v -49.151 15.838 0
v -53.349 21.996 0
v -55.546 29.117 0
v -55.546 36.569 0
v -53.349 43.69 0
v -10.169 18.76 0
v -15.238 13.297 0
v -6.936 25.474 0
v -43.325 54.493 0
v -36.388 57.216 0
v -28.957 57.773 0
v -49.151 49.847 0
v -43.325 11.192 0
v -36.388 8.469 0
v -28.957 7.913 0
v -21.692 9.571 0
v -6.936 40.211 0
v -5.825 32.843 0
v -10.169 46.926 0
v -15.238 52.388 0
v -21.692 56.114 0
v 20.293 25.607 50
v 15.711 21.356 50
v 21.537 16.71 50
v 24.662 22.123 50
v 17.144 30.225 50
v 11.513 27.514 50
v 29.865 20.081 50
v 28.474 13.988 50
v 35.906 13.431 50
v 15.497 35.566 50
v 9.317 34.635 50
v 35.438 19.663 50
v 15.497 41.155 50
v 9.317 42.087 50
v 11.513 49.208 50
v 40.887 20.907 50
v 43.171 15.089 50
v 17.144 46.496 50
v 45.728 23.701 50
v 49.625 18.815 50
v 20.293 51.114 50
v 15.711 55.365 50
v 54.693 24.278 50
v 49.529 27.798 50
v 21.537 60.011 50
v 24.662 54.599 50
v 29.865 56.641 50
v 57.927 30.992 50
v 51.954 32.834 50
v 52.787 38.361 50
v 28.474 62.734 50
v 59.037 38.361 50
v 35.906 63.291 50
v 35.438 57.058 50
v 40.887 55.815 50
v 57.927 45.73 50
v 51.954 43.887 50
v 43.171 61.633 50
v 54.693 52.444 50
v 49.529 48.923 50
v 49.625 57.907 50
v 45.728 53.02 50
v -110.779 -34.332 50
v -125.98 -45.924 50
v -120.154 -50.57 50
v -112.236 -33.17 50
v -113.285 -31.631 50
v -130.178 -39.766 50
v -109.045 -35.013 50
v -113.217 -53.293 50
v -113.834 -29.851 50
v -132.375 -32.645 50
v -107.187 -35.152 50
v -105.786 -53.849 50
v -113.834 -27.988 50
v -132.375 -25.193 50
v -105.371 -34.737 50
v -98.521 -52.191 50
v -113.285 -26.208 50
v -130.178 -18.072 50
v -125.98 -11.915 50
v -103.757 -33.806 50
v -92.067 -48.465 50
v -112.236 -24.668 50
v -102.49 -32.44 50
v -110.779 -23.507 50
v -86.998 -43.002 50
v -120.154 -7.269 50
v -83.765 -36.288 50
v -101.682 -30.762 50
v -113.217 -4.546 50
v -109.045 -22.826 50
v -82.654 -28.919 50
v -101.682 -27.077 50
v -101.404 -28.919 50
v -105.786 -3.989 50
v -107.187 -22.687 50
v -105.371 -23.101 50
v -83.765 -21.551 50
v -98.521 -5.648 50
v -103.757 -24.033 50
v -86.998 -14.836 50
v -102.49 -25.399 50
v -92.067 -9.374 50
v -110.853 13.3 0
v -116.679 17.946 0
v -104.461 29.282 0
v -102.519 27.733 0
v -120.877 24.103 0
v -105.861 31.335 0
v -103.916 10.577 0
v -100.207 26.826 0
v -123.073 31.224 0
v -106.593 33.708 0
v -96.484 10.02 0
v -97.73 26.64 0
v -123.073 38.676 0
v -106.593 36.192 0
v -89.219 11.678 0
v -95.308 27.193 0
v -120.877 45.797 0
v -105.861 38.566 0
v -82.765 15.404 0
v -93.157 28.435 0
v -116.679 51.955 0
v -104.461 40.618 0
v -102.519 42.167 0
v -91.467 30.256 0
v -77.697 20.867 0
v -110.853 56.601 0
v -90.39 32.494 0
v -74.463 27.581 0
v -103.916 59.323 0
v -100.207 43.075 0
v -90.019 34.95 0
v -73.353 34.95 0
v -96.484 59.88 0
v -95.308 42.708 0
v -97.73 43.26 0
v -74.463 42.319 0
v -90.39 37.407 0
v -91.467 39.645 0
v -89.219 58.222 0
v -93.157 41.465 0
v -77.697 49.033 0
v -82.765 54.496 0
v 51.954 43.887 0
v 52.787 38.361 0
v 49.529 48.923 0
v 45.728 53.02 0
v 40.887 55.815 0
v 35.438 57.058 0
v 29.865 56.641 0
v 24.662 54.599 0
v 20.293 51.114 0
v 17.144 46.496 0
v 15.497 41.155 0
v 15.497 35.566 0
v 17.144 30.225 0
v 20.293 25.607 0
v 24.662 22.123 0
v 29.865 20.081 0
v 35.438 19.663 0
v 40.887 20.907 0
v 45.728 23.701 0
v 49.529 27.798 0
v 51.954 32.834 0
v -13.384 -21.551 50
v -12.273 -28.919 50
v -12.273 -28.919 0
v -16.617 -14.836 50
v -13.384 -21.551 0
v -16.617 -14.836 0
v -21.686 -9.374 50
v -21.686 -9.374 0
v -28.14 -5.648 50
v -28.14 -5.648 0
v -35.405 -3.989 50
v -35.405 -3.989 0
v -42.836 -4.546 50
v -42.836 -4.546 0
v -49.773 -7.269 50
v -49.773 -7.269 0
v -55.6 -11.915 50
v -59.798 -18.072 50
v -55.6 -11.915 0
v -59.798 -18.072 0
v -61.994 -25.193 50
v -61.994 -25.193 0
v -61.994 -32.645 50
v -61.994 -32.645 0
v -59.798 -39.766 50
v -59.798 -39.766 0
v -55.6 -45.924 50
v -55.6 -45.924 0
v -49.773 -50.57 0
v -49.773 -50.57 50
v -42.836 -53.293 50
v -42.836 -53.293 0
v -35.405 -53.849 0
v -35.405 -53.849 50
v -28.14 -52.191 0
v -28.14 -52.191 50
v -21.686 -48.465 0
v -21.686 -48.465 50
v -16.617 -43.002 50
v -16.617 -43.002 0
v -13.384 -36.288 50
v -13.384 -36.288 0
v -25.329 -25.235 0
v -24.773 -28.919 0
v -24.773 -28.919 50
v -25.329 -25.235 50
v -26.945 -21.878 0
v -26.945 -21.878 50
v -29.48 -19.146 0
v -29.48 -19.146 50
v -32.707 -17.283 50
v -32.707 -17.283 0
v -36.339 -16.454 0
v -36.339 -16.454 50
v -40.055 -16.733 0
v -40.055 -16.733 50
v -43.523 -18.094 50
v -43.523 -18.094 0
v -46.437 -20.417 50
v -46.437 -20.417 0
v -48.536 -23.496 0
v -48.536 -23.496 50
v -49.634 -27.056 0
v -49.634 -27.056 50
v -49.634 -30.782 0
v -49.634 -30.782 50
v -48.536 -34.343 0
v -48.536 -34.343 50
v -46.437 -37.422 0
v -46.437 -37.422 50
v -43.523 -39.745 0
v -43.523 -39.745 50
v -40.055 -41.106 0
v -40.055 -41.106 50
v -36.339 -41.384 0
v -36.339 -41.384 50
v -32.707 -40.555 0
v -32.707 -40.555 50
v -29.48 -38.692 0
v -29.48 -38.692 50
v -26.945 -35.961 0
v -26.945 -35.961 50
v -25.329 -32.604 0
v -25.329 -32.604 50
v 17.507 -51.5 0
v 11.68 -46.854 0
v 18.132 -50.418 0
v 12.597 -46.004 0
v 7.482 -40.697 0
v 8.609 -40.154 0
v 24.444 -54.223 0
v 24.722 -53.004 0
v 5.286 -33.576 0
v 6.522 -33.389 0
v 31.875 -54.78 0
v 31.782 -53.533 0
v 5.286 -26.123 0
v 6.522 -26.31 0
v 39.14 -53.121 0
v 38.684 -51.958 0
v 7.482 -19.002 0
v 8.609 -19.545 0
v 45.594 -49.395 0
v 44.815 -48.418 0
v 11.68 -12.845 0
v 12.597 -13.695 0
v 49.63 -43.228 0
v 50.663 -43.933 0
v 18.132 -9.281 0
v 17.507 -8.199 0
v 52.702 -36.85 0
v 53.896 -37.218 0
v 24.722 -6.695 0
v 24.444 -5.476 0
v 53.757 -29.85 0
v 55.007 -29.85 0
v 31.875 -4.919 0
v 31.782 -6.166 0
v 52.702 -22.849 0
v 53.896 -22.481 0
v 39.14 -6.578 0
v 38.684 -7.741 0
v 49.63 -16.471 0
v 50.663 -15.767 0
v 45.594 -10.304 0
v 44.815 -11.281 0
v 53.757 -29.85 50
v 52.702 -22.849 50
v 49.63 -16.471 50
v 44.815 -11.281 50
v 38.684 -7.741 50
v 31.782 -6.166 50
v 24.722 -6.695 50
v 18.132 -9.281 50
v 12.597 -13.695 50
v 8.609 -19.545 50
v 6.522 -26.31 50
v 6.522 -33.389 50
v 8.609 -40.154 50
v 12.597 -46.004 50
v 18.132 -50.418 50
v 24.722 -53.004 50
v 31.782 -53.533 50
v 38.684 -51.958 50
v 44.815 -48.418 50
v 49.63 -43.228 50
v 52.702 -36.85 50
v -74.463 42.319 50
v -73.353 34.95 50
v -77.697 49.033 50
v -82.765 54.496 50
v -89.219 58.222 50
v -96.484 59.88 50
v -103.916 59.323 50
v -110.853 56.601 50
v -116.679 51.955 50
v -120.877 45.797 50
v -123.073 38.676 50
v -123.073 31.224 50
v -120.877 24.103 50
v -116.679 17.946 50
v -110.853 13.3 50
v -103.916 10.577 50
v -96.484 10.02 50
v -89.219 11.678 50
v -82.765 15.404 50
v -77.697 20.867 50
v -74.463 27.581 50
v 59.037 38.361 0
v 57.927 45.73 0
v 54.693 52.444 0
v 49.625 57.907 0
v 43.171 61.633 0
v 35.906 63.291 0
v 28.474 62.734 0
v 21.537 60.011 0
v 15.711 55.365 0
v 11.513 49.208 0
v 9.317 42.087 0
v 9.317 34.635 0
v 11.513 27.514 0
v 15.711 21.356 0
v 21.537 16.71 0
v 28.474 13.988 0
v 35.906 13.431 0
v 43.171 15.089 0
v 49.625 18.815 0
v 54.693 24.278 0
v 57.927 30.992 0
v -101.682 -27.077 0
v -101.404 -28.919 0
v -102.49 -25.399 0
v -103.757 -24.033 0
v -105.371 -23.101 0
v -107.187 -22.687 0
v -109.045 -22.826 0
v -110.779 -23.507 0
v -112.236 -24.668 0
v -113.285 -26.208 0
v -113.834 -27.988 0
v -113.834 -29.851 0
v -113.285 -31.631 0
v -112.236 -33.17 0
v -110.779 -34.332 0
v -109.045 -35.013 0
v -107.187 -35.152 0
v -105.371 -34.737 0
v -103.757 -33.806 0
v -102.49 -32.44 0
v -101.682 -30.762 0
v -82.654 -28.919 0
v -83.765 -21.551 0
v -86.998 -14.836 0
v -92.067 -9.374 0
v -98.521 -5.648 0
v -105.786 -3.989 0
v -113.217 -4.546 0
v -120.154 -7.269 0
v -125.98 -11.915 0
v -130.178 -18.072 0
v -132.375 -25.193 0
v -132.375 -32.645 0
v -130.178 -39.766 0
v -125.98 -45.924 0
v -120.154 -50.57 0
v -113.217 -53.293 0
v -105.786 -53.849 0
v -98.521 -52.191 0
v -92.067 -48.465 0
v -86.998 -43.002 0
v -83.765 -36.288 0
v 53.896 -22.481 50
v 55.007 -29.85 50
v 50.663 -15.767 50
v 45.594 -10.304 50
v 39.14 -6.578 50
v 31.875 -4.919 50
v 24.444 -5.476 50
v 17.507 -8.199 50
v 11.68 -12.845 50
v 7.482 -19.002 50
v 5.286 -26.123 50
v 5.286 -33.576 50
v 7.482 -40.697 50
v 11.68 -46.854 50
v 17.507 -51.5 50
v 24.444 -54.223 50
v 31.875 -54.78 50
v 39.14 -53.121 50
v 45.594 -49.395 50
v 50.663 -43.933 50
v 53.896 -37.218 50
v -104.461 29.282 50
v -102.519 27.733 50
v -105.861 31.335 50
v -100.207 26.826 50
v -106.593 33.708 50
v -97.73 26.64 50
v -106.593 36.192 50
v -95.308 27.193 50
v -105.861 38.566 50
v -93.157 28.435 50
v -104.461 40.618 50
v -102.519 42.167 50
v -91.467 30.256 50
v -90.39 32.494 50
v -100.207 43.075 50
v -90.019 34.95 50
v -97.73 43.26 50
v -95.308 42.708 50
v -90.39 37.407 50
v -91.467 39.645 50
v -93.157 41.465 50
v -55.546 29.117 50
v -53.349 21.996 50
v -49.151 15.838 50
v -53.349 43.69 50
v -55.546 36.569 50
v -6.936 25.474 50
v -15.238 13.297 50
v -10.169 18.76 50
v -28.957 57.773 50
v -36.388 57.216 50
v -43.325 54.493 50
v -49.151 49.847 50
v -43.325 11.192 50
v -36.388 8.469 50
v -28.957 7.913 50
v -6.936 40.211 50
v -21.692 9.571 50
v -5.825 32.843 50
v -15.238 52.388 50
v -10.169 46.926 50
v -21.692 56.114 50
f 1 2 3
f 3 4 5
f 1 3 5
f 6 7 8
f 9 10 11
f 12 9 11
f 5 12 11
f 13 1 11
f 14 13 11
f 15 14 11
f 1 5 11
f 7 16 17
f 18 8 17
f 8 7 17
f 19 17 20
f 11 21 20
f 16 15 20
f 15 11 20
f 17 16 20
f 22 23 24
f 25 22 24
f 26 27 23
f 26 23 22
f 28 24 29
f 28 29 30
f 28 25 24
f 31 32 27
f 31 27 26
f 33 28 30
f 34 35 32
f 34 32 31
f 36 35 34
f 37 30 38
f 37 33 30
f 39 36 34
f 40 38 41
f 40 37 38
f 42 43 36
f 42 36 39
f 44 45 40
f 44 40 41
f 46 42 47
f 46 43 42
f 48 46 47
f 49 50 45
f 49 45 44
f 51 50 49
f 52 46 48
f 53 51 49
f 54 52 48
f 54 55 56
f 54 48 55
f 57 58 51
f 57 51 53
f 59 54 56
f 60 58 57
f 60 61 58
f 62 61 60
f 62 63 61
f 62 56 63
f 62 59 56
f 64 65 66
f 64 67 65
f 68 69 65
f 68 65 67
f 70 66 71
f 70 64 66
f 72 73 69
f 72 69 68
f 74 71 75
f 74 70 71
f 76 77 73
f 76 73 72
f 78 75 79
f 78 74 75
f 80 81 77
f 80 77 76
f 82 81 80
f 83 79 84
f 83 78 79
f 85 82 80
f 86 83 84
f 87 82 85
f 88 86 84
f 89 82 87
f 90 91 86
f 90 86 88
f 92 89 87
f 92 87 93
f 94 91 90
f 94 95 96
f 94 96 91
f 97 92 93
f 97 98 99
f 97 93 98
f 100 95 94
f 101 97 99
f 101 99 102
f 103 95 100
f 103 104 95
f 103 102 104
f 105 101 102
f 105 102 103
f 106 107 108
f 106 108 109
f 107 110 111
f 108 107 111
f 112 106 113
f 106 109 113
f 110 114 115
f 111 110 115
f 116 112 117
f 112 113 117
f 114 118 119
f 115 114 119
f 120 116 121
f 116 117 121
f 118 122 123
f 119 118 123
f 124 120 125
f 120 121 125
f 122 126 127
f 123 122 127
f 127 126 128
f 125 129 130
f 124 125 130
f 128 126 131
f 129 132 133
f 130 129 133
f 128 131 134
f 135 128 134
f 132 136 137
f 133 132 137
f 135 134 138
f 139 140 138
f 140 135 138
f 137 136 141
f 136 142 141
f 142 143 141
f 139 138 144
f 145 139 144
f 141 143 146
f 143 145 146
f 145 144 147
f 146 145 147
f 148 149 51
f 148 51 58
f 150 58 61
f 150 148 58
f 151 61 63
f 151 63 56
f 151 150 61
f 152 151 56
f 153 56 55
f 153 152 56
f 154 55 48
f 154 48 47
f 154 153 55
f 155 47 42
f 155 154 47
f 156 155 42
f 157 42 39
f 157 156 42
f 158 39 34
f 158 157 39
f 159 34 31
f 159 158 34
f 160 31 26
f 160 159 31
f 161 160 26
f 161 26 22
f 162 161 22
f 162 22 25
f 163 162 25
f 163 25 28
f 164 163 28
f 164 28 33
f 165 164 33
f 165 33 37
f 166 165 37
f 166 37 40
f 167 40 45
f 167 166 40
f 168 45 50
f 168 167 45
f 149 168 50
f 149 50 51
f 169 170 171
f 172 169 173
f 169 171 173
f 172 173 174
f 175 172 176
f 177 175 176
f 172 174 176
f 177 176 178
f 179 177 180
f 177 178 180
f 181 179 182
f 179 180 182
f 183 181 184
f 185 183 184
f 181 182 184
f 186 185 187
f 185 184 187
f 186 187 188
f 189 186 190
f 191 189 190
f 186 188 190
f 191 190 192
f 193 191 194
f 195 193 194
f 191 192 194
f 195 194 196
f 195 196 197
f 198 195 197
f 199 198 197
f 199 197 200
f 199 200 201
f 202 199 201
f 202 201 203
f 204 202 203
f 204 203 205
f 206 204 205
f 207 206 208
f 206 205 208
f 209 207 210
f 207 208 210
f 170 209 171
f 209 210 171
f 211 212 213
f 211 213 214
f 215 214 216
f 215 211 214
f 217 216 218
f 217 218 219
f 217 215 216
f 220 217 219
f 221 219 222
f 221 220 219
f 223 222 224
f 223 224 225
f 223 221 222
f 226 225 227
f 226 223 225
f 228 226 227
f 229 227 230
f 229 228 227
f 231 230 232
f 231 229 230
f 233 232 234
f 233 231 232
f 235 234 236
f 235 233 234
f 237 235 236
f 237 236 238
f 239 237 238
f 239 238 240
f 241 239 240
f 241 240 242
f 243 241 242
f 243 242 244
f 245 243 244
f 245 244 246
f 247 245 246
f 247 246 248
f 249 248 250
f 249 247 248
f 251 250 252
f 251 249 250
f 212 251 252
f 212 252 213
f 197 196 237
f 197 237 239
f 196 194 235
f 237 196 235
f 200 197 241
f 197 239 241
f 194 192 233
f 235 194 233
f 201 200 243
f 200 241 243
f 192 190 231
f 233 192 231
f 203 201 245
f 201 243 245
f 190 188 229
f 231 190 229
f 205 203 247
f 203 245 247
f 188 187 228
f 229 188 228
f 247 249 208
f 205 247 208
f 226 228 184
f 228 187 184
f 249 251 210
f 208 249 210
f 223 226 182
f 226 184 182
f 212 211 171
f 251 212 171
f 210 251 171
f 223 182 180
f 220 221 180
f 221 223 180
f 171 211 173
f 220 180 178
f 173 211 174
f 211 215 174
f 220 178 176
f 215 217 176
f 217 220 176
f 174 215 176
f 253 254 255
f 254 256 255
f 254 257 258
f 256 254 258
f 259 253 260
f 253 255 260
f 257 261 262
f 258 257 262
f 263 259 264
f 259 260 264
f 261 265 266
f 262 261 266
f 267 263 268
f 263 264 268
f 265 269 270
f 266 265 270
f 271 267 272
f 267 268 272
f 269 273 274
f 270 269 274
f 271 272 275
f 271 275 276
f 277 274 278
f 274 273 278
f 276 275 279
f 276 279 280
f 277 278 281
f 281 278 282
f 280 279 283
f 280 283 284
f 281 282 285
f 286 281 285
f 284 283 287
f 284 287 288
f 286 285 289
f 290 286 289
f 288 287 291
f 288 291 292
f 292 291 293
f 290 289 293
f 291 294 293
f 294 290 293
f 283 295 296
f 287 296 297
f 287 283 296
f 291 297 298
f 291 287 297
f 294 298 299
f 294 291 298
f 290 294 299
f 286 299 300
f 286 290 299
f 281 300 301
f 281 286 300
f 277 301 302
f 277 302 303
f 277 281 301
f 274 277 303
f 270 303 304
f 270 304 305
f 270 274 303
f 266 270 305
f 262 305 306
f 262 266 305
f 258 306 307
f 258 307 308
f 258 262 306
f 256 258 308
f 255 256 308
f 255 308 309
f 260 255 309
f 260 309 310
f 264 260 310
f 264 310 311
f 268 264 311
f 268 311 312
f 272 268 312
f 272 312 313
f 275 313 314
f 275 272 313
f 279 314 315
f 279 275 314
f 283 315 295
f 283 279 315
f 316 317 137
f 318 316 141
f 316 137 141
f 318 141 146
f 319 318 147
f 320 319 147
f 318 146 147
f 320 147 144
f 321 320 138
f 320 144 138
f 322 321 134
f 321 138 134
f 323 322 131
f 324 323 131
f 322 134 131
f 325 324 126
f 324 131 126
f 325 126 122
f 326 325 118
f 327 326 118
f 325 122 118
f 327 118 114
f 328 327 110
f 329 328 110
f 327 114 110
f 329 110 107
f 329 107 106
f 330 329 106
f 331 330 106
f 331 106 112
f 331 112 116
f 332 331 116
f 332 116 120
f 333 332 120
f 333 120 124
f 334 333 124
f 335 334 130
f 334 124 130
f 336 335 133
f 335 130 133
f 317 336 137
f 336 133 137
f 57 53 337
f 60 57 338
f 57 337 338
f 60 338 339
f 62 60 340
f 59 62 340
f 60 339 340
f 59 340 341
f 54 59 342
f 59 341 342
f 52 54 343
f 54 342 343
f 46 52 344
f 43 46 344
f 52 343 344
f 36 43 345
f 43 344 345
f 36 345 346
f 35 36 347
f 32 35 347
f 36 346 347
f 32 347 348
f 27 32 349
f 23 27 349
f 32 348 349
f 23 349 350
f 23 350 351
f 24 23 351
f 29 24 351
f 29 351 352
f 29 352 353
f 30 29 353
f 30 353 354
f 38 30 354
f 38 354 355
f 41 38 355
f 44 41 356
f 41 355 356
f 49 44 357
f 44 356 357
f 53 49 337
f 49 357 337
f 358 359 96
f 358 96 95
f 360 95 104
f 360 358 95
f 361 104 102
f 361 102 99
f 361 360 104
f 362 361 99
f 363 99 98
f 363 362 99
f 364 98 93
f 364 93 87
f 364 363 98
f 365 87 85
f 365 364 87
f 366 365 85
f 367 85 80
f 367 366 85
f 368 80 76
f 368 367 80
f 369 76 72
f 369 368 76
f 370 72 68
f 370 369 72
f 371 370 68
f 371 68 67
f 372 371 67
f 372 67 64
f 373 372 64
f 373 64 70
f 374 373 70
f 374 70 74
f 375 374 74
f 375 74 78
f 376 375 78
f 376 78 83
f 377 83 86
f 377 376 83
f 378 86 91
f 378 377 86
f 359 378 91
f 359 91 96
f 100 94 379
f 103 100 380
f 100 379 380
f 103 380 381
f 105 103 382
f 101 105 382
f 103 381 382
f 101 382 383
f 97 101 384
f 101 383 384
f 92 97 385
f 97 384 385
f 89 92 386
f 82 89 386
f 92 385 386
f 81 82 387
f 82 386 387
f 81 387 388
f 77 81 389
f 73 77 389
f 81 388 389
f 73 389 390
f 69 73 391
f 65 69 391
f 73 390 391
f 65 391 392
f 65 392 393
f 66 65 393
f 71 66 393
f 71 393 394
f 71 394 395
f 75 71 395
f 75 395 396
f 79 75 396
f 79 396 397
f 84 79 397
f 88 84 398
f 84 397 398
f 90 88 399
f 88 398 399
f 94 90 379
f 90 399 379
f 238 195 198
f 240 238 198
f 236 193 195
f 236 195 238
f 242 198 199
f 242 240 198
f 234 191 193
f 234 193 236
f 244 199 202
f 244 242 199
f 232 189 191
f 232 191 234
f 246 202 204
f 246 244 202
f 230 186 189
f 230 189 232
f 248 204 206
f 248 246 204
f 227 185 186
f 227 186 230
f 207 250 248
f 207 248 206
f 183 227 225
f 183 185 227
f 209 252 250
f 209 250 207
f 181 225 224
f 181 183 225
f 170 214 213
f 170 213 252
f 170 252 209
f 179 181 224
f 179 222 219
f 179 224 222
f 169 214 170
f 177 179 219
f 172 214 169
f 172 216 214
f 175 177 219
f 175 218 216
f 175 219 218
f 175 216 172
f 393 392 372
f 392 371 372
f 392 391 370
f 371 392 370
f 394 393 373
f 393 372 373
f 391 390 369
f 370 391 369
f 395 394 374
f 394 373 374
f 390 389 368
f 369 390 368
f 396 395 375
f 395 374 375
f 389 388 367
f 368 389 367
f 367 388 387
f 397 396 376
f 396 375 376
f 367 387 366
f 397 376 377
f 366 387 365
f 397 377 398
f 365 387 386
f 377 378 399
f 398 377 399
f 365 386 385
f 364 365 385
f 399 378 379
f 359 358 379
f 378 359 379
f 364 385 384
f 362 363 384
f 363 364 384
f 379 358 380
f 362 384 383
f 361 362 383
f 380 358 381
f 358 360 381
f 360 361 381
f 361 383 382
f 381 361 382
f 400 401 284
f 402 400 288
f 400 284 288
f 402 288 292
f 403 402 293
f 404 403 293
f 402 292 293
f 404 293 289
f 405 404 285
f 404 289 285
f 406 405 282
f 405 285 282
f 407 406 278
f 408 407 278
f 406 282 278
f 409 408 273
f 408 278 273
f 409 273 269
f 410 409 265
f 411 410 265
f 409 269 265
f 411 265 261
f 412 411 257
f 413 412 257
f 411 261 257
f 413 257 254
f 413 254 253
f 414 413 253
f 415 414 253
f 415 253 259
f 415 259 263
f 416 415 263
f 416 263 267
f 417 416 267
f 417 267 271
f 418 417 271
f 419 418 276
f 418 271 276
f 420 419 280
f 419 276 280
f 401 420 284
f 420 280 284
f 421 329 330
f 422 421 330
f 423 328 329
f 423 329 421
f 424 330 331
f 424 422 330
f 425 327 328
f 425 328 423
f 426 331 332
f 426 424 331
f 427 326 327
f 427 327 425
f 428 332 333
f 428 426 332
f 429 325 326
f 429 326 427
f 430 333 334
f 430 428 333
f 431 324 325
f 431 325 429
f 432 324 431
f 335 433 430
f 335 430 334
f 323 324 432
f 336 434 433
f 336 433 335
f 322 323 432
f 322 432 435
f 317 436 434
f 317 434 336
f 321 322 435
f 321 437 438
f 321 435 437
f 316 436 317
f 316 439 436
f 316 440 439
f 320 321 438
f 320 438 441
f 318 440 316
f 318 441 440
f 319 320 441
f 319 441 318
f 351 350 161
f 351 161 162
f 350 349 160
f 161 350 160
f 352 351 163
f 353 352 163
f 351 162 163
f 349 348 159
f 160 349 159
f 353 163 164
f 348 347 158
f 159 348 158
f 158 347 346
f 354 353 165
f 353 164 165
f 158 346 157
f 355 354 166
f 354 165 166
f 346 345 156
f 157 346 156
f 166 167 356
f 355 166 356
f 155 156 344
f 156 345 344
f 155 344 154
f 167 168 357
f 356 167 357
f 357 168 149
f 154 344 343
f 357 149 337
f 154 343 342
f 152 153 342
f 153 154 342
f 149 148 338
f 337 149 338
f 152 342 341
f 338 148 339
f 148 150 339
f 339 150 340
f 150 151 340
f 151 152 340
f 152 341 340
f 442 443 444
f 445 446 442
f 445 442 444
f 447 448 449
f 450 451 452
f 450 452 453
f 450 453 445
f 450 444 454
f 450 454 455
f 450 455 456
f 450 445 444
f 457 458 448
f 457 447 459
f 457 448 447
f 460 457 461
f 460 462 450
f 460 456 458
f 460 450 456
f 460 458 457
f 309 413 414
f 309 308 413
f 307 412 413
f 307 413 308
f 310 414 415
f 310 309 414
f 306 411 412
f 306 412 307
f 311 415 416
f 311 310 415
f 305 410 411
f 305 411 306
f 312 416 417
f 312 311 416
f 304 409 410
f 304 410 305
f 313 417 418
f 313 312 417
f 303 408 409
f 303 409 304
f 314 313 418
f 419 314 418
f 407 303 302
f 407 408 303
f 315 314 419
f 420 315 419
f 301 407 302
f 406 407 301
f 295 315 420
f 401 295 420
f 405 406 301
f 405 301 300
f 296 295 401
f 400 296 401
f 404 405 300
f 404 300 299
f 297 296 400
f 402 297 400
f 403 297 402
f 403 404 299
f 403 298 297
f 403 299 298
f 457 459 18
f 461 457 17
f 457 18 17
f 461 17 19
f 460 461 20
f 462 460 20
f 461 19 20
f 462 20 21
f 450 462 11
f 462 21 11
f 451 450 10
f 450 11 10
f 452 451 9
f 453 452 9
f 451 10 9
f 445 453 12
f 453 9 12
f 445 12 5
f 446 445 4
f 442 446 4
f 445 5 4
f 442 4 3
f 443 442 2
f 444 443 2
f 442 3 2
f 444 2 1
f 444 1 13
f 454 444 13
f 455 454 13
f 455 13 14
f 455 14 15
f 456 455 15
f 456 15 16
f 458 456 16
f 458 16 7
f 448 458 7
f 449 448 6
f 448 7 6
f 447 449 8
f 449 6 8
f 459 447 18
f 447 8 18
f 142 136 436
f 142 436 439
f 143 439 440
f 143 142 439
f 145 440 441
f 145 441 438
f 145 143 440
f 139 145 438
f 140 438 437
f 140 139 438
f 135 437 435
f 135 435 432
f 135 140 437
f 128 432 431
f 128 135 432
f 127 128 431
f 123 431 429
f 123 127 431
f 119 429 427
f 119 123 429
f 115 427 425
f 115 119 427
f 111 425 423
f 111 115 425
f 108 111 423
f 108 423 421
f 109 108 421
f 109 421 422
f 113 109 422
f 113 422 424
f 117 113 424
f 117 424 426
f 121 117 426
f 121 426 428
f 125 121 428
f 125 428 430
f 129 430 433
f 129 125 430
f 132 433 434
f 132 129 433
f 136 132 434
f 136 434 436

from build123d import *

# Parameters (mm, degrees)
F0_R     = 25
F0_R_2   = 8.333333
F0_R_3   = 18.75
F0_R_4   = 6.25
F0_R_5   = 12.5
F0_R_6   = 23.75
F1_DEPTH = 50


with BuildPart() as f1:
    # F0 (on Top) → F1 (new body)
    with BuildSketch(Plane.XY):
        with Locations((-98.352633, 34.950223)):
            Circle(F0_R)
        with Locations((-98.352633, 34.950223)):
            Circle(F0_R_2, mode=Mode.SUBTRACT)
        with Locations((-30.825168, 32.842603)):
            Circle(F0_R)
        with Locations((34.037288, 38.360734)):
            Circle(F0_R)
        with Locations((34.037288, 38.360734)):
            Circle(F0_R_3, mode=Mode.SUBTRACT)
        with Locations((-107.654028, -28.919389)):
            Circle(F0_R)
        with Locations((-107.654028, -28.919389)):
            Circle(F0_R_4, mode=Mode.SUBTRACT)
        with Locations((-37.273441, -28.919389)):
            Circle(F0_R)
        with Locations((-37.273441, -28.919389)):
            Circle(F0_R_5, mode=Mode.SUBTRACT)
        with Locations((30.006681, -29.849529)):
            Circle(F0_R)
        with Locations((30.006681, -29.849529)):
            Circle(F0_R_6, mode=Mode.SUBTRACT)
    extrude(amount=F1_DEPTH)


solid = f1.part
